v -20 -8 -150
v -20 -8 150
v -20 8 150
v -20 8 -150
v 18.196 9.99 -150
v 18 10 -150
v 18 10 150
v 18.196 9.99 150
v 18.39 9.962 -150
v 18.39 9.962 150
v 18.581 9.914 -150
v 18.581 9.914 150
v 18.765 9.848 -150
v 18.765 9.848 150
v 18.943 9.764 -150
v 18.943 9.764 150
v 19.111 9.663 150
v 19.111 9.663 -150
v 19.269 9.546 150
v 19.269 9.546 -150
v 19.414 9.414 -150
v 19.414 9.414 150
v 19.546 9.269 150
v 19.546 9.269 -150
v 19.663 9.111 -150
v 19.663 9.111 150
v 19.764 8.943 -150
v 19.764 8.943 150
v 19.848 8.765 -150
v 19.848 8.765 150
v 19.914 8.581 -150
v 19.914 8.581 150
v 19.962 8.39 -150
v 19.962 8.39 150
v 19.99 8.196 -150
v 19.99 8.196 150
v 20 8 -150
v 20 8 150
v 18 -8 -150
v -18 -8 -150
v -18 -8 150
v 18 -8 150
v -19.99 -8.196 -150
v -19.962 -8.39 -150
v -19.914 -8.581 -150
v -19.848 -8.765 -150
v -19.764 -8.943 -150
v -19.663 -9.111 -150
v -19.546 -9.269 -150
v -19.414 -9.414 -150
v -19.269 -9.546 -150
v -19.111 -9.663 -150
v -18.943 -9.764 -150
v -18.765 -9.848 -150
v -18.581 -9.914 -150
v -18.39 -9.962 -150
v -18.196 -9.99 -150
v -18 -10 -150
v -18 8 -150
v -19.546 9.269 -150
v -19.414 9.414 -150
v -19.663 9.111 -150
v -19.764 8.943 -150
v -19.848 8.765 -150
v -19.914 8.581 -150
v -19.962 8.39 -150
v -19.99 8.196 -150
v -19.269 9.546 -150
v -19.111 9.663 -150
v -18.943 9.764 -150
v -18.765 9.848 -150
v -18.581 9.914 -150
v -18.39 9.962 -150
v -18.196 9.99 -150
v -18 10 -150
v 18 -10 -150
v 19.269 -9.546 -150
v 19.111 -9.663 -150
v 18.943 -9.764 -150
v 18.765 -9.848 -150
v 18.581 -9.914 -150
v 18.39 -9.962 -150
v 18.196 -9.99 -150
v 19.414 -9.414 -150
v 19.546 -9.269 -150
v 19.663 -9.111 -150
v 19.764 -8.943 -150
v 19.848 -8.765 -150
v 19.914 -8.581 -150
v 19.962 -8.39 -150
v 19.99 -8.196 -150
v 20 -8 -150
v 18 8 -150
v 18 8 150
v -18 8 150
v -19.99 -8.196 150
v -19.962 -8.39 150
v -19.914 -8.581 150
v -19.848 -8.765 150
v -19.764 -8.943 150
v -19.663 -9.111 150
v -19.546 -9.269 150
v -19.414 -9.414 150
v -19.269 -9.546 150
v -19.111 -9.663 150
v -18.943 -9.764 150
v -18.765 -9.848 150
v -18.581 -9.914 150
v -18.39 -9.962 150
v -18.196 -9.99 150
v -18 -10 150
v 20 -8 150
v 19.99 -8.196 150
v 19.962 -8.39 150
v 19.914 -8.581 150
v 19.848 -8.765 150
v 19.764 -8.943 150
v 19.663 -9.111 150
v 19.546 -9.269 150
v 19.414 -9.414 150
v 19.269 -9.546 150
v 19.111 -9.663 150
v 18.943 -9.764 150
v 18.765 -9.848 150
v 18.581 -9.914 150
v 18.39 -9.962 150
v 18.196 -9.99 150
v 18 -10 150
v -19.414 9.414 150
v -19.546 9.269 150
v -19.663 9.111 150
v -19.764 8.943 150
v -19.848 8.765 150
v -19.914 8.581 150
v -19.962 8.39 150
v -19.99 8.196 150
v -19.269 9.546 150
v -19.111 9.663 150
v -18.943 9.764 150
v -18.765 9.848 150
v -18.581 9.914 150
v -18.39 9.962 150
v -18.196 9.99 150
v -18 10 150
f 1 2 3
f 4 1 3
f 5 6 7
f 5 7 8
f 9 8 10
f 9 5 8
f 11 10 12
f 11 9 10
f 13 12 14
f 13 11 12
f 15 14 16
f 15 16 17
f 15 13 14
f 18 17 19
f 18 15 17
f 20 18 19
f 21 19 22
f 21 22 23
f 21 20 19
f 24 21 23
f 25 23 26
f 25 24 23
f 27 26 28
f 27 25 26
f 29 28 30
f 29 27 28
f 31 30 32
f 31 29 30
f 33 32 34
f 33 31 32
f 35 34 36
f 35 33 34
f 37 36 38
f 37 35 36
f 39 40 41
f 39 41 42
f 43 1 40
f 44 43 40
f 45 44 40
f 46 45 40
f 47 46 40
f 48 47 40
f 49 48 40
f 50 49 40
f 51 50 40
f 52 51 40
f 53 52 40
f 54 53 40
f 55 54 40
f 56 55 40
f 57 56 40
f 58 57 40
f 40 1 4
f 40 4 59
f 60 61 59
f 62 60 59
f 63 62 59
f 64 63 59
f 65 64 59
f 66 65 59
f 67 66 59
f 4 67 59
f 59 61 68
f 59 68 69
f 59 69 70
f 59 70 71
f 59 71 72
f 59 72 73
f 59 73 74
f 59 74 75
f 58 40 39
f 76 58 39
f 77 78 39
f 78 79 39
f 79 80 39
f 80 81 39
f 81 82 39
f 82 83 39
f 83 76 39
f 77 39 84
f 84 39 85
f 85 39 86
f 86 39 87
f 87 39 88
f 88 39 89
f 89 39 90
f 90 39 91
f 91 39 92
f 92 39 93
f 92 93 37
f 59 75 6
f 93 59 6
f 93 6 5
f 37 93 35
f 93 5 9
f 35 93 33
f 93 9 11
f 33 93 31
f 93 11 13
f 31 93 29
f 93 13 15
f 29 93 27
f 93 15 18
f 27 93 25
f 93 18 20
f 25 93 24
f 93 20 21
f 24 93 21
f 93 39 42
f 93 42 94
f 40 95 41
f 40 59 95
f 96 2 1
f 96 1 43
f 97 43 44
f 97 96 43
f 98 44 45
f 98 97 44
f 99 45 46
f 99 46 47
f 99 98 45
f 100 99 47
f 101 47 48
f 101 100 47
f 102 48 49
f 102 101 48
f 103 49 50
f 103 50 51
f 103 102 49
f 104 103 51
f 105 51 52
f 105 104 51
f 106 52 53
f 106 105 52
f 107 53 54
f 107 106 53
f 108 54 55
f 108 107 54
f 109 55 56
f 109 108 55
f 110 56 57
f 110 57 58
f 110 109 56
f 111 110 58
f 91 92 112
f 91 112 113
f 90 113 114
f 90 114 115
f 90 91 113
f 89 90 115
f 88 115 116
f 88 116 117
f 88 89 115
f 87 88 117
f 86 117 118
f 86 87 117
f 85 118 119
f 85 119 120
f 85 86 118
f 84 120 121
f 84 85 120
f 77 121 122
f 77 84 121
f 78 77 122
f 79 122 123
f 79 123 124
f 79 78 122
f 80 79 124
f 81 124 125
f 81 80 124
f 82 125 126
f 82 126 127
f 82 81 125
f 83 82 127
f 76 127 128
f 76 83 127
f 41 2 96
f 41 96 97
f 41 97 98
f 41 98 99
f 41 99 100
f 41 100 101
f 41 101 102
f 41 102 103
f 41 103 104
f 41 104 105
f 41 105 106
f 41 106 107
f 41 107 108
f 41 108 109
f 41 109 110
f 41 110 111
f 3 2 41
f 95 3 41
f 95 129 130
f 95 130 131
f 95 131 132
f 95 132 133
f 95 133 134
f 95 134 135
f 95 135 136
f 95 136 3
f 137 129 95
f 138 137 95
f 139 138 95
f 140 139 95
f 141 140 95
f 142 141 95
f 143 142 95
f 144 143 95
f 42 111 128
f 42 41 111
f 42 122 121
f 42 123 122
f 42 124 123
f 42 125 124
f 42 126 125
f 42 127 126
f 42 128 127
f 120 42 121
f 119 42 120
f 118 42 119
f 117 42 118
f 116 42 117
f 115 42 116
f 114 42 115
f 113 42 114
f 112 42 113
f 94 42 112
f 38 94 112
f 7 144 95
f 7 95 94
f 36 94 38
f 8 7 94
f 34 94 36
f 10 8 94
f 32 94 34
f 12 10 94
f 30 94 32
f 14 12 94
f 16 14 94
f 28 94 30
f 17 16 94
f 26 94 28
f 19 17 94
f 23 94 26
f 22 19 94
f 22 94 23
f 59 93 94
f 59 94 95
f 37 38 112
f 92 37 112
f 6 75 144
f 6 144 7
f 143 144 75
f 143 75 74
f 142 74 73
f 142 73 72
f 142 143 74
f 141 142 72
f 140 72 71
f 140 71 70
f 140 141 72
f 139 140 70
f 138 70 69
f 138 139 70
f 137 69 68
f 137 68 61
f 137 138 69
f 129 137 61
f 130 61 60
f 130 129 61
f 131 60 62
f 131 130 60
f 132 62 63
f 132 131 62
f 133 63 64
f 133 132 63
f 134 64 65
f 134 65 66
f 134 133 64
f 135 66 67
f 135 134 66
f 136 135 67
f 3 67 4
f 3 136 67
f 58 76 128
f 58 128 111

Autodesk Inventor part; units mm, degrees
ref_plane "YZ Plane" through (0, 0, 0) normal (1, 0, 0) x (0, 1, 0)
ref_plane "XZ Plane" through (0, 0, 0) normal (0, 1, 0) x (-1, 0, 0)
ref_plane "XY Plane" through (0, 0, 0) normal (0, 0, 1) x (1, 0, 0)
sketch "Sketch1" plane through (0, 0, 0) normal (0, 0, 1) x (1, 0, 0)
  line L0 (-20, 10) -> (20, 10)
  line L1 (20, 10) -> (20, -10)
  line L2 (20, -10) -> (-20, -10)
  line L3 (-20, -10) -> (-20, 10)
  line L4 (-20, 10) -> (20, -10) construction
  line L5 (20, 10) -> (-20, -10) construction
  line L6 (18, 8) -> (-18, 8)
  line L7 (-18, 8) -> (-18, -8)
  line L8 (-18, -8) -> (18, -8)
  line L9 (18, -8) -> (18, 8)
  point P0 (0, 0)
  dimension "d0" = 40
  dimension "d1" = 20
  dimension "d2" = 2
extrude "Extrusion1" add sketch "Sketch1" along normal mid plane 300
fillet "Fillet1" radius 2 4 edges at (-20, 10, 0) (-20, -10, 0) (20, -10, 0) (20, 10, 0)
properties part number "Leg tube 1"
